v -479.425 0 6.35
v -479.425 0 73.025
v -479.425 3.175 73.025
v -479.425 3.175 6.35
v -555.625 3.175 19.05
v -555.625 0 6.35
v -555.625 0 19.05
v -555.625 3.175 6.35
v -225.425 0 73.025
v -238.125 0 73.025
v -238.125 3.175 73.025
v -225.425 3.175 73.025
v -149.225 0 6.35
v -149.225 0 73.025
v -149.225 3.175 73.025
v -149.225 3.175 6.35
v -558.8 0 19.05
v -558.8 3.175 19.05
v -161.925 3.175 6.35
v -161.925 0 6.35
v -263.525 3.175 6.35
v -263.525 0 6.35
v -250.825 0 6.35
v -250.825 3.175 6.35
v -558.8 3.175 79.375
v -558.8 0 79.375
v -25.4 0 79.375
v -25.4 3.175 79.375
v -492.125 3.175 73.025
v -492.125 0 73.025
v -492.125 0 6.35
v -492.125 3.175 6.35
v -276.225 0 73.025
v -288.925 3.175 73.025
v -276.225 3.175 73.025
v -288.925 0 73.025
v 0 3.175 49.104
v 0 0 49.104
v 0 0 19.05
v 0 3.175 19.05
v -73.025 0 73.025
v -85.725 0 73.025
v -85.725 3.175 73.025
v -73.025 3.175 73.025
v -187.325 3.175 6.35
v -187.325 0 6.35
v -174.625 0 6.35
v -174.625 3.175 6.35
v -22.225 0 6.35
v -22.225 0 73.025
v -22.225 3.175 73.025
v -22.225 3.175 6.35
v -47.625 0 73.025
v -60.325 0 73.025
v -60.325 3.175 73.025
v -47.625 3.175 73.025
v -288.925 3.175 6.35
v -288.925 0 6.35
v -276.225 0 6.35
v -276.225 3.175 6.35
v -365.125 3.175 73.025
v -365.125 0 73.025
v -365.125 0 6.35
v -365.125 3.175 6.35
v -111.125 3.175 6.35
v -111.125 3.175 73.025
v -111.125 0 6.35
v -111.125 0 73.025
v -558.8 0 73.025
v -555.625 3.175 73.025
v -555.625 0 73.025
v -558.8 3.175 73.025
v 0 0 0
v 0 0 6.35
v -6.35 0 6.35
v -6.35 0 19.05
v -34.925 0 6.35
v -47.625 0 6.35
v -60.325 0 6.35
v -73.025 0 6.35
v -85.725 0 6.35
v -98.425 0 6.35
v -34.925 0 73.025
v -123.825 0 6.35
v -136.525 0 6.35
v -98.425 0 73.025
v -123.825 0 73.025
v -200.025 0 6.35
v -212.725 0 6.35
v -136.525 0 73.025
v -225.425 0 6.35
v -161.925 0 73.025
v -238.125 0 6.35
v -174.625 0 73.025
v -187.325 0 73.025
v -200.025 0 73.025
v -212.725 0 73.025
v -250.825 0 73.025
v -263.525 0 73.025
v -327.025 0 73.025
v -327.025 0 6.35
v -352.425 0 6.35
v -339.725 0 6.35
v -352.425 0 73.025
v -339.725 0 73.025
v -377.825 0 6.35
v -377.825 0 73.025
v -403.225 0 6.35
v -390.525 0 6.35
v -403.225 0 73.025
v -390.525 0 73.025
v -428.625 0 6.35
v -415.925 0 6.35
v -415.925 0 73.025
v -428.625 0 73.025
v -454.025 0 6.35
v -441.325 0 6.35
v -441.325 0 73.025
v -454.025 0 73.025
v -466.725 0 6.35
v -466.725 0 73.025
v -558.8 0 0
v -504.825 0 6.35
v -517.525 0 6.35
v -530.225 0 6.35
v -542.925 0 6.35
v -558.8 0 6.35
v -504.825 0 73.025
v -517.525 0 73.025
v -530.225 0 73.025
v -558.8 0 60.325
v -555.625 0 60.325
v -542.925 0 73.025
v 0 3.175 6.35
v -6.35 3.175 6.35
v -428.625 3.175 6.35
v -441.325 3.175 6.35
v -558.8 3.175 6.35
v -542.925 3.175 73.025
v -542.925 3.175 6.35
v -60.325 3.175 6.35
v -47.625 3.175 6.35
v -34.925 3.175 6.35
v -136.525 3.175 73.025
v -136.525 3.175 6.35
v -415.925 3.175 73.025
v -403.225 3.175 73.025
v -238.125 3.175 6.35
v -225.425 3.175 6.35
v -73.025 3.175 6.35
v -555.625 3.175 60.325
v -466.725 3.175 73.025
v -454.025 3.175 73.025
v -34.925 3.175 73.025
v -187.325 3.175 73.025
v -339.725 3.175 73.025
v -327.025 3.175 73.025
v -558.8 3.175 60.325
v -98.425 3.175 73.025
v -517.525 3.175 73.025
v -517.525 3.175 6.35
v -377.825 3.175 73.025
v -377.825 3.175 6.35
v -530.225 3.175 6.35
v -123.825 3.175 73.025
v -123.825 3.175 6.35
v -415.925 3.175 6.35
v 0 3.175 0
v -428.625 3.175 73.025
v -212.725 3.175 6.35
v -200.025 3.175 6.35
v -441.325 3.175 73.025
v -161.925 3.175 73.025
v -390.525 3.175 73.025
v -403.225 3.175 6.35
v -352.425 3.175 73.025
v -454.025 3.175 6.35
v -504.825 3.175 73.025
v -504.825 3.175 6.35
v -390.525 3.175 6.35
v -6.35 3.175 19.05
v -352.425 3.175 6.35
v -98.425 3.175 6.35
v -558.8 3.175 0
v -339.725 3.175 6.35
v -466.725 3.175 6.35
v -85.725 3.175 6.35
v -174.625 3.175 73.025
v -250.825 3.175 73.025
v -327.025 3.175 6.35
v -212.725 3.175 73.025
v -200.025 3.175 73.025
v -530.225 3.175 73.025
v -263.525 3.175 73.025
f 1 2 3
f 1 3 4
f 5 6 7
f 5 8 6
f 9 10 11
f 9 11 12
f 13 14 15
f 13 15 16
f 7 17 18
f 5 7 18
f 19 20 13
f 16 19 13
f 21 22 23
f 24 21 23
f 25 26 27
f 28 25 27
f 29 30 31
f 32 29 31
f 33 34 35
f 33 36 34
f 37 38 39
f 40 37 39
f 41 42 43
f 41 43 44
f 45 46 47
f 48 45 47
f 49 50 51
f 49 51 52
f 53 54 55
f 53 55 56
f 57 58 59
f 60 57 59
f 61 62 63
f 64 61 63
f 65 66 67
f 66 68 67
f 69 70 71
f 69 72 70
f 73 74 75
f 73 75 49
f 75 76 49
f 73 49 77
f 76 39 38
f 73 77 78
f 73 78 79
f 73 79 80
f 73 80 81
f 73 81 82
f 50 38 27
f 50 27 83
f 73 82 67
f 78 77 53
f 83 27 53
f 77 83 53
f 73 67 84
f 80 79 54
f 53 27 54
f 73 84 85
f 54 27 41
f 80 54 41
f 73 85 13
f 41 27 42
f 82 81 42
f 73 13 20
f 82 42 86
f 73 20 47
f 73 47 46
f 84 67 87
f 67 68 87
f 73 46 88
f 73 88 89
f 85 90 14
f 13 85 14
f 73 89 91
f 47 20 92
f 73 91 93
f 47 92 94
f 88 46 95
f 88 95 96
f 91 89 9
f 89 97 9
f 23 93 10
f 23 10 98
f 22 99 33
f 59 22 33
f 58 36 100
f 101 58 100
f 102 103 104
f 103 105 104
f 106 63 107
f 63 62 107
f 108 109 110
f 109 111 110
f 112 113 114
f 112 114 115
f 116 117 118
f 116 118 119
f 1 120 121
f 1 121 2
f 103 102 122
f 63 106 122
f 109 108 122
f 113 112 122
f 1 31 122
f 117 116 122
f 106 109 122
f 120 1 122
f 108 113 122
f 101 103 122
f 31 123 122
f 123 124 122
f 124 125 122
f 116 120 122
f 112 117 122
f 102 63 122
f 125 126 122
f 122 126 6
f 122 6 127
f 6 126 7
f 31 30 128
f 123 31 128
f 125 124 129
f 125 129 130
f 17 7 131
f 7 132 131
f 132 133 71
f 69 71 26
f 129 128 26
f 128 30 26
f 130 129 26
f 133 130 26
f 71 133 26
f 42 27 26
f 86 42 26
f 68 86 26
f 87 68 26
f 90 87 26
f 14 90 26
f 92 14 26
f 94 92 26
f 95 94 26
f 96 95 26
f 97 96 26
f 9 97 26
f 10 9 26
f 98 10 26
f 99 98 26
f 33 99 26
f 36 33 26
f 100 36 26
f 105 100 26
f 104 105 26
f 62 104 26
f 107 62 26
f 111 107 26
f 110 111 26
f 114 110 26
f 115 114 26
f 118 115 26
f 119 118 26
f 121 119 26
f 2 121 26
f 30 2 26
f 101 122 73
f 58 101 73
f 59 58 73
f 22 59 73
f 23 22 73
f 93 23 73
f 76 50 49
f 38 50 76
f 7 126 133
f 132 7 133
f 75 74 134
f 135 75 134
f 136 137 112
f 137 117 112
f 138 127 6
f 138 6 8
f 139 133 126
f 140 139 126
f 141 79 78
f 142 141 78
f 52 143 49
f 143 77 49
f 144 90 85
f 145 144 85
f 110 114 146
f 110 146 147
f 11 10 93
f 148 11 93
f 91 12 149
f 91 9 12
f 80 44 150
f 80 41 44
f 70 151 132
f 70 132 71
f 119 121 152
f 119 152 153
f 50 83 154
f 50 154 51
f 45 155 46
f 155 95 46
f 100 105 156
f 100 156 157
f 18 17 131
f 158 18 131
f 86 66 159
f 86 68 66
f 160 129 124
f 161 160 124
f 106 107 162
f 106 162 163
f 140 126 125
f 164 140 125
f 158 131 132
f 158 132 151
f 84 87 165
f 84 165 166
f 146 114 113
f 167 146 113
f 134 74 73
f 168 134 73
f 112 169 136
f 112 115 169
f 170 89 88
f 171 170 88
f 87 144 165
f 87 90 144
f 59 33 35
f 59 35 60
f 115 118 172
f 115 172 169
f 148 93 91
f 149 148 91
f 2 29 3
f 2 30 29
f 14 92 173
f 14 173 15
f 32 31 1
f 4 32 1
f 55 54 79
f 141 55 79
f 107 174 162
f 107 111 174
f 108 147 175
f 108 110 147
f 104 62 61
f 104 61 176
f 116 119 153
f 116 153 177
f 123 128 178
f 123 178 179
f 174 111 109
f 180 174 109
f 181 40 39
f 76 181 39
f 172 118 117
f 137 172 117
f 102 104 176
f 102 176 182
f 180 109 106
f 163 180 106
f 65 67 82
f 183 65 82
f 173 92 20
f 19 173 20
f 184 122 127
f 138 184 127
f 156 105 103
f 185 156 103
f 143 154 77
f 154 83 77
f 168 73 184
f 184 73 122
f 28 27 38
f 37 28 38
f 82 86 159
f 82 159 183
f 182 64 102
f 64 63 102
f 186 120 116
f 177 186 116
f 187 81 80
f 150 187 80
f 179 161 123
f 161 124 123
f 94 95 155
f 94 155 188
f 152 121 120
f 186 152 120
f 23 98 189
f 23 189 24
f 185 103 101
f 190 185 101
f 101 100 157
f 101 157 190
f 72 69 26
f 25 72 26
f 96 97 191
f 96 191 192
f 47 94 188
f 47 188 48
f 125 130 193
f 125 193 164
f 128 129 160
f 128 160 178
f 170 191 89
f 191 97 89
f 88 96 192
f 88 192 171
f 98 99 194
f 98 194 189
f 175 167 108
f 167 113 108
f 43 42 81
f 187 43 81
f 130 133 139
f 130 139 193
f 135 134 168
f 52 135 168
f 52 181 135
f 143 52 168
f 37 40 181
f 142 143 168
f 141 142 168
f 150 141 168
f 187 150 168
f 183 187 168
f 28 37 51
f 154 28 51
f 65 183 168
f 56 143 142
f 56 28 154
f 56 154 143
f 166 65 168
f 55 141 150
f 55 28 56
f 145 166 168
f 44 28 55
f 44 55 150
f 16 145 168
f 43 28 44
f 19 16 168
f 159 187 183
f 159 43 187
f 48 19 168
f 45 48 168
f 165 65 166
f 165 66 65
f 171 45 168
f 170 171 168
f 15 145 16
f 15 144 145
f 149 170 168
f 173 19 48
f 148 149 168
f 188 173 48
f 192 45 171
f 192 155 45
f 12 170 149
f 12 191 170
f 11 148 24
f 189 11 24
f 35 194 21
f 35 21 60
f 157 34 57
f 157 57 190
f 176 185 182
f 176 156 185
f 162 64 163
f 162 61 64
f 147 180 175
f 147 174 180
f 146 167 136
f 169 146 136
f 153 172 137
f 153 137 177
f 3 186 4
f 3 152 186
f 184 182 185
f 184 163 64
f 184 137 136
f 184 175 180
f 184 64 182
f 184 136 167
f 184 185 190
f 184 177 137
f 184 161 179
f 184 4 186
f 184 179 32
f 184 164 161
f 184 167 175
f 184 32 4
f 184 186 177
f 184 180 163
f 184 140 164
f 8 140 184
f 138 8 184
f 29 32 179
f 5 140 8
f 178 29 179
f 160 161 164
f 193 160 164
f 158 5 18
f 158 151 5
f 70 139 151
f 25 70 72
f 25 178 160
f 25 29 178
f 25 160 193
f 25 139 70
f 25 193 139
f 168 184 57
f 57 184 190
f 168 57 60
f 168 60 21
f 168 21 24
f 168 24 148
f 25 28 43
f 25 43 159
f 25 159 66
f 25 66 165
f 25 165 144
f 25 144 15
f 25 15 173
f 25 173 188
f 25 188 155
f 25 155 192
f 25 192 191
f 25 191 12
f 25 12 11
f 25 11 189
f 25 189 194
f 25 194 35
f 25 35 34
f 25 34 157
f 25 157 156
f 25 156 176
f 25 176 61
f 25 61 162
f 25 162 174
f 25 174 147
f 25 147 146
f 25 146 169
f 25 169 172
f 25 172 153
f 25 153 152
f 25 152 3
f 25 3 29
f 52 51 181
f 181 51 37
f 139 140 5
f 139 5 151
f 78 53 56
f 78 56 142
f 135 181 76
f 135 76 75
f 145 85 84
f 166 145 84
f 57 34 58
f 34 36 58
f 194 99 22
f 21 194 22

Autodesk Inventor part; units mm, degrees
ref_plane "YZ Plane" through (0, 0, 0) normal (1, 0, 0) x (0, 1, 0)
ref_plane "XZ Plane" through (0, 0, 0) normal (0, 1, 0) x (-1, 0, 0)
ref_plane "XY Plane" through (0, 0, 0) normal (0, 0, 1) x (1, 0, 0)
sketch "Sketch1" plane through (0, 0, 0) normal (0, 1, 0) x (-1, 0, 0)
  line L0 (0, 0) -> (558.8, 0)
  line L1 (558.8, 0) -> (558.8, 79.375)
  line L2 (558.8, 79.375) -> (0, 79.375)
  line L3 (0, 79.375) -> (0, 0)
  dimension "d0" = 79.375
  dimension "d1" = 558.8
extrude "Extrusion1" add sketch "Sketch1" along normal blind 3.175
sketch "Sketch3" plane through (-558.8, 0, 0) normal (-1, 0, 0) x (0, 0, 1)
  line L0 (0, 0) -> (79.375, 0) projected
  line L1 (79.375, 0) -> (79.375, 3.175) projected
  line L2 (0, 3.175) -> (79.375, 3.175) projected
  line L3 (0, 0) -> (0, 3.175) projected
  line L4 (73.025, 3.175) -> (73.025, 0)
  line L5 (60.325, 0) -> (60.325, 3.175)
  line L6 (19.05, 0) -> (19.05, 3.175)
  line L7 (6.35, 0) -> (6.35, 3.175)
  dimension "d4" = 12.7
  dimension "d5" = 6.35
  dimension "d6" = 12.7
  dimension "d7" = 6.35
extrude "Extrusion2" cut sketch "Sketch3" against normal blind 3.175 contours L7 L2 L6 L0 | L5 L2 L4 L0
sketch "Sketch4" plane through (0, 0, 79.375) normal (1, 0, 0) x (0, 0, -1)
  line L0 (19.05, 3.175) -> (6.35, 3.175) projected
  line L1 (19.05, 0) -> (19.05, 3.175) projected
  line L2 (6.35, 0) -> (19.05, 0) projected
  line L3 (6.35, 3.175) -> (6.35, 0) projected
  line L4 (60.325, 3.175) -> (60.325, 0) projected
  line L5 (73.025, 3.175) -> (60.325, 3.175) projected
  line L6 (73.025, 0) -> (73.025, 3.175) projected
  line L7 (60.325, 0) -> (73.025, 0) projected
extrude "Extrusion3" cut sketch "Sketch4" against normal blind 6.35
sketch "Sketch5" plane through (0, 0, 0) normal (0, -1, 0) x (1, 0, 0)
  line L0 (-558.8, 79.375) -> (0, 79.375) projected
  line L1 (-558.8, 19.05) -> (-558.8, 60.325) projected
  line L2 (0, 0) -> (-558.8, 0) projected
  line L3 (-542.925, 73.025) -> (-542.925, 6.35)
  line L4 (-542.925, 6.35) -> (-530.225, 6.35)
  line L5 (-542.925, 73.025) -> (-530.225, 73.025)
  line L6 (-530.225, 73.025) -> (-530.225, 6.35)
  line L7 (-517.525, 73.025) -> (-517.525, 6.35)
  line L8 (-517.525, 6.35) -> (-504.825, 6.35)
  line L9 (-517.525, 73.025) -> (-504.825, 73.025)
  line L10 (-504.825, 73.025) -> (-504.825, 6.35)
  line L11 (-492.125, 73.025) -> (-492.125, 6.35)
  line L12 (-492.125, 6.35) -> (-479.425, 6.35)
  line L13 (-492.125, 73.025) -> (-479.425, 73.025)
  line L14 (-479.425, 73.025) -> (-479.425, 6.35)
  line L15 (-466.725, 73.025) -> (-466.725, 6.35)
  line L16 (-466.725, 6.35) -> (-454.025, 6.35)
  line L17 (-466.725, 73.025) -> (-454.025, 73.025)
  line L18 (-454.025, 73.025) -> (-454.025, 6.35)
  line L19 (-441.325, 73.025) -> (-441.325, 6.35)
  line L20 (-441.325, 6.35) -> (-428.625, 6.35)
  line L21 (-441.325, 73.025) -> (-428.625, 73.025)
  line L22 (-428.625, 73.025) -> (-428.625, 6.35)
  line L23 (-415.925, 73.025) -> (-415.925, 6.35)
  line L24 (-415.925, 6.35) -> (-403.225, 6.35)
  line L25 (-415.925, 73.025) -> (-403.225, 73.025)
  line L26 (-403.225, 73.025) -> (-403.225, 6.35)
  line L27 (-390.525, 73.025) -> (-390.525, 6.35)
  line L28 (-390.525, 6.35) -> (-377.825, 6.35)
  line L29 (-390.525, 73.025) -> (-377.825, 73.025)
  line L30 (-377.825, 73.025) -> (-377.825, 6.35)
  line L31 (-365.125, 73.025) -> (-365.125, 6.35)
  line L32 (-365.125, 6.35) -> (-352.425, 6.35)
  line L33 (-365.125, 73.025) -> (-352.425, 73.025)
  line L34 (-352.425, 73.025) -> (-352.425, 6.35)
  line L35 (-339.725, 73.025) -> (-339.725, 6.35)
  line L36 (-339.725, 6.35) -> (-327.025, 6.35)
  line L37 (-339.725, 73.025) -> (-327.025, 73.025)
  line L38 (-327.025, 73.025) -> (-327.025, 6.35)
  line L39 (-314.325, 73.025) -> (-314.325, 6.35)
  line L40 (-314.325, 6.35) -> (-301.625, 6.35)
  line L41 (-314.325, 73.025) -> (-301.625, 73.025)
  line L42 (-301.625, 73.025) -> (-301.625, 6.35)
  line L43 (-288.925, 73.025) -> (-288.925, 6.35)
  line L44 (-288.925, 6.35) -> (-276.225, 6.35)
  line L45 (-288.925, 73.025) -> (-276.225, 73.025)
  line L46 (-276.225, 73.025) -> (-276.225, 6.35)
  line L47 (-263.525, 73.025) -> (-263.525, 6.35)
  line L48 (-263.525, 6.35) -> (-250.825, 6.35)
  line L49 (-263.525, 73.025) -> (-250.825, 73.025)
  line L50 (-250.825, 73.025) -> (-250.825, 6.35)
  line L51 (-238.125, 73.025) -> (-238.125, 6.35)
  line L52 (-238.125, 6.35) -> (-225.425, 6.35)
  line L53 (-238.125, 73.025) -> (-225.425, 73.025)
  line L54 (-225.425, 73.025) -> (-225.425, 6.35)
  line L55 (-212.725, 73.025) -> (-212.725, 6.35)
  line L56 (-212.725, 6.35) -> (-200.025, 6.35)
  line L57 (-212.725, 73.025) -> (-200.025, 73.025)
  line L58 (-200.025, 73.025) -> (-200.025, 6.35)
  line L59 (-187.325, 73.025) -> (-187.325, 6.35)
  line L60 (-187.325, 6.35) -> (-174.625, 6.35)
  line L61 (-187.325, 73.025) -> (-174.625, 73.025)
  line L62 (-174.625, 73.025) -> (-174.625, 6.35)
  line L63 (-161.925, 73.025) -> (-161.925, 6.35)
  line L64 (-161.925, 6.35) -> (-149.225, 6.35)
  line L65 (-161.925, 73.025) -> (-149.225, 73.025)
  line L66 (-149.225, 73.025) -> (-149.225, 6.35)
  line L67 (-136.525, 73.025) -> (-136.525, 6.35)
  line L68 (-136.525, 6.35) -> (-123.825, 6.35)
  line L69 (-136.525, 73.025) -> (-123.825, 73.025)
  line L70 (-123.825, 73.025) -> (-123.825, 6.35)
  line L71 (-111.125, 73.025) -> (-111.125, 6.35)
  line L72 (-111.125, 6.35) -> (-98.425, 6.35)
  line L73 (-111.125, 73.025) -> (-98.425, 73.025)
  line L74 (-98.425, 73.025) -> (-98.425, 6.35)
  line L75 (-85.725, 73.025) -> (-85.725, 6.35)
  line L76 (-85.725, 6.35) -> (-73.025, 6.35)
  line L77 (-85.725, 73.025) -> (-73.025, 73.025)
  line L78 (-73.025, 73.025) -> (-73.025, 6.35)
  line L79 (-60.325, 73.025) -> (-60.325, 6.35)
  line L80 (-60.325, 6.35) -> (-47.625, 6.35)
  line L81 (-60.325, 73.025) -> (-47.625, 73.025)
  line L82 (-47.625, 73.025) -> (-47.625, 6.35)
  line L83 (-34.925, 73.025) -> (-34.925, 6.35)
  line L84 (-34.925, 6.35) -> (-22.225, 6.35)
  line L85 (-34.925, 73.025) -> (-22.225, 73.025)
  line L86 (-22.225, 73.025) -> (-22.225, 6.35)
  dimension "d12" = 12.7
  dimension "d14" = 15.875
  dimension "d15" = 6.35
  dimension "d16" = 6.35
  dimension "d19" = 25.4
extrude "Extrusion4" cut sketch "Sketch5" against normal blind 25.4 contours L5 L6 L4 L3 | L9 L10 L8 L7 | L13 L14 L12 L11 | L17 L18 L16 L15 | L21 L22 L20 L19 | L25 L26 L24 L23 | L29 L30 L28 L27 | L33 L34 L32 L31 | L37 L38 L36 L35 | L45 L46 L44 L43 | L49 L50 L48 L47 | L53 L54 L52 L51 | L57 L58 L56 L55 | L61 L62 L60 L59 | L65 L66 L64 L63 | L69 L70 L68 L67 | L73 L74 L72 L71 | L77 L78 L76 L75 | L81 L82 L80 L79 | L85 L86 L84 L83
sketch "Sketch6" plane through (0, 0, 0) normal (0, -1, 0) x (1, 0, 0)
  line L0 (0, 60.325) -> (-6.35, 60.325) projected
  line L1 (-6.35, 60.325) -> (-6.35, 73.025) projected
  line L2 (-6.35, 73.025) -> (0, 73.025) projected
  line L3 (0, 79.375) -> (0, 73.025) projected
  line L4 (-558.8, 79.375) -> (0, 79.375) projected
  line L5 (0, 60.325) -> (0, 19.05) projected
  line L6 (0, 60.325) -> (0, 73.025)
  line L7 (-25.4, 79.375) -> (0, 49.1045)
  dimension "d26" = 50
  dimension "d27" = 25.4
extrude "Extrusion5" cut sketch "Sketch6" against normal blind 25.4 contours L5 L7 L4 L3 L2 L1 L0
properties part number "Wing" material "Polycarbonate, Clear"
